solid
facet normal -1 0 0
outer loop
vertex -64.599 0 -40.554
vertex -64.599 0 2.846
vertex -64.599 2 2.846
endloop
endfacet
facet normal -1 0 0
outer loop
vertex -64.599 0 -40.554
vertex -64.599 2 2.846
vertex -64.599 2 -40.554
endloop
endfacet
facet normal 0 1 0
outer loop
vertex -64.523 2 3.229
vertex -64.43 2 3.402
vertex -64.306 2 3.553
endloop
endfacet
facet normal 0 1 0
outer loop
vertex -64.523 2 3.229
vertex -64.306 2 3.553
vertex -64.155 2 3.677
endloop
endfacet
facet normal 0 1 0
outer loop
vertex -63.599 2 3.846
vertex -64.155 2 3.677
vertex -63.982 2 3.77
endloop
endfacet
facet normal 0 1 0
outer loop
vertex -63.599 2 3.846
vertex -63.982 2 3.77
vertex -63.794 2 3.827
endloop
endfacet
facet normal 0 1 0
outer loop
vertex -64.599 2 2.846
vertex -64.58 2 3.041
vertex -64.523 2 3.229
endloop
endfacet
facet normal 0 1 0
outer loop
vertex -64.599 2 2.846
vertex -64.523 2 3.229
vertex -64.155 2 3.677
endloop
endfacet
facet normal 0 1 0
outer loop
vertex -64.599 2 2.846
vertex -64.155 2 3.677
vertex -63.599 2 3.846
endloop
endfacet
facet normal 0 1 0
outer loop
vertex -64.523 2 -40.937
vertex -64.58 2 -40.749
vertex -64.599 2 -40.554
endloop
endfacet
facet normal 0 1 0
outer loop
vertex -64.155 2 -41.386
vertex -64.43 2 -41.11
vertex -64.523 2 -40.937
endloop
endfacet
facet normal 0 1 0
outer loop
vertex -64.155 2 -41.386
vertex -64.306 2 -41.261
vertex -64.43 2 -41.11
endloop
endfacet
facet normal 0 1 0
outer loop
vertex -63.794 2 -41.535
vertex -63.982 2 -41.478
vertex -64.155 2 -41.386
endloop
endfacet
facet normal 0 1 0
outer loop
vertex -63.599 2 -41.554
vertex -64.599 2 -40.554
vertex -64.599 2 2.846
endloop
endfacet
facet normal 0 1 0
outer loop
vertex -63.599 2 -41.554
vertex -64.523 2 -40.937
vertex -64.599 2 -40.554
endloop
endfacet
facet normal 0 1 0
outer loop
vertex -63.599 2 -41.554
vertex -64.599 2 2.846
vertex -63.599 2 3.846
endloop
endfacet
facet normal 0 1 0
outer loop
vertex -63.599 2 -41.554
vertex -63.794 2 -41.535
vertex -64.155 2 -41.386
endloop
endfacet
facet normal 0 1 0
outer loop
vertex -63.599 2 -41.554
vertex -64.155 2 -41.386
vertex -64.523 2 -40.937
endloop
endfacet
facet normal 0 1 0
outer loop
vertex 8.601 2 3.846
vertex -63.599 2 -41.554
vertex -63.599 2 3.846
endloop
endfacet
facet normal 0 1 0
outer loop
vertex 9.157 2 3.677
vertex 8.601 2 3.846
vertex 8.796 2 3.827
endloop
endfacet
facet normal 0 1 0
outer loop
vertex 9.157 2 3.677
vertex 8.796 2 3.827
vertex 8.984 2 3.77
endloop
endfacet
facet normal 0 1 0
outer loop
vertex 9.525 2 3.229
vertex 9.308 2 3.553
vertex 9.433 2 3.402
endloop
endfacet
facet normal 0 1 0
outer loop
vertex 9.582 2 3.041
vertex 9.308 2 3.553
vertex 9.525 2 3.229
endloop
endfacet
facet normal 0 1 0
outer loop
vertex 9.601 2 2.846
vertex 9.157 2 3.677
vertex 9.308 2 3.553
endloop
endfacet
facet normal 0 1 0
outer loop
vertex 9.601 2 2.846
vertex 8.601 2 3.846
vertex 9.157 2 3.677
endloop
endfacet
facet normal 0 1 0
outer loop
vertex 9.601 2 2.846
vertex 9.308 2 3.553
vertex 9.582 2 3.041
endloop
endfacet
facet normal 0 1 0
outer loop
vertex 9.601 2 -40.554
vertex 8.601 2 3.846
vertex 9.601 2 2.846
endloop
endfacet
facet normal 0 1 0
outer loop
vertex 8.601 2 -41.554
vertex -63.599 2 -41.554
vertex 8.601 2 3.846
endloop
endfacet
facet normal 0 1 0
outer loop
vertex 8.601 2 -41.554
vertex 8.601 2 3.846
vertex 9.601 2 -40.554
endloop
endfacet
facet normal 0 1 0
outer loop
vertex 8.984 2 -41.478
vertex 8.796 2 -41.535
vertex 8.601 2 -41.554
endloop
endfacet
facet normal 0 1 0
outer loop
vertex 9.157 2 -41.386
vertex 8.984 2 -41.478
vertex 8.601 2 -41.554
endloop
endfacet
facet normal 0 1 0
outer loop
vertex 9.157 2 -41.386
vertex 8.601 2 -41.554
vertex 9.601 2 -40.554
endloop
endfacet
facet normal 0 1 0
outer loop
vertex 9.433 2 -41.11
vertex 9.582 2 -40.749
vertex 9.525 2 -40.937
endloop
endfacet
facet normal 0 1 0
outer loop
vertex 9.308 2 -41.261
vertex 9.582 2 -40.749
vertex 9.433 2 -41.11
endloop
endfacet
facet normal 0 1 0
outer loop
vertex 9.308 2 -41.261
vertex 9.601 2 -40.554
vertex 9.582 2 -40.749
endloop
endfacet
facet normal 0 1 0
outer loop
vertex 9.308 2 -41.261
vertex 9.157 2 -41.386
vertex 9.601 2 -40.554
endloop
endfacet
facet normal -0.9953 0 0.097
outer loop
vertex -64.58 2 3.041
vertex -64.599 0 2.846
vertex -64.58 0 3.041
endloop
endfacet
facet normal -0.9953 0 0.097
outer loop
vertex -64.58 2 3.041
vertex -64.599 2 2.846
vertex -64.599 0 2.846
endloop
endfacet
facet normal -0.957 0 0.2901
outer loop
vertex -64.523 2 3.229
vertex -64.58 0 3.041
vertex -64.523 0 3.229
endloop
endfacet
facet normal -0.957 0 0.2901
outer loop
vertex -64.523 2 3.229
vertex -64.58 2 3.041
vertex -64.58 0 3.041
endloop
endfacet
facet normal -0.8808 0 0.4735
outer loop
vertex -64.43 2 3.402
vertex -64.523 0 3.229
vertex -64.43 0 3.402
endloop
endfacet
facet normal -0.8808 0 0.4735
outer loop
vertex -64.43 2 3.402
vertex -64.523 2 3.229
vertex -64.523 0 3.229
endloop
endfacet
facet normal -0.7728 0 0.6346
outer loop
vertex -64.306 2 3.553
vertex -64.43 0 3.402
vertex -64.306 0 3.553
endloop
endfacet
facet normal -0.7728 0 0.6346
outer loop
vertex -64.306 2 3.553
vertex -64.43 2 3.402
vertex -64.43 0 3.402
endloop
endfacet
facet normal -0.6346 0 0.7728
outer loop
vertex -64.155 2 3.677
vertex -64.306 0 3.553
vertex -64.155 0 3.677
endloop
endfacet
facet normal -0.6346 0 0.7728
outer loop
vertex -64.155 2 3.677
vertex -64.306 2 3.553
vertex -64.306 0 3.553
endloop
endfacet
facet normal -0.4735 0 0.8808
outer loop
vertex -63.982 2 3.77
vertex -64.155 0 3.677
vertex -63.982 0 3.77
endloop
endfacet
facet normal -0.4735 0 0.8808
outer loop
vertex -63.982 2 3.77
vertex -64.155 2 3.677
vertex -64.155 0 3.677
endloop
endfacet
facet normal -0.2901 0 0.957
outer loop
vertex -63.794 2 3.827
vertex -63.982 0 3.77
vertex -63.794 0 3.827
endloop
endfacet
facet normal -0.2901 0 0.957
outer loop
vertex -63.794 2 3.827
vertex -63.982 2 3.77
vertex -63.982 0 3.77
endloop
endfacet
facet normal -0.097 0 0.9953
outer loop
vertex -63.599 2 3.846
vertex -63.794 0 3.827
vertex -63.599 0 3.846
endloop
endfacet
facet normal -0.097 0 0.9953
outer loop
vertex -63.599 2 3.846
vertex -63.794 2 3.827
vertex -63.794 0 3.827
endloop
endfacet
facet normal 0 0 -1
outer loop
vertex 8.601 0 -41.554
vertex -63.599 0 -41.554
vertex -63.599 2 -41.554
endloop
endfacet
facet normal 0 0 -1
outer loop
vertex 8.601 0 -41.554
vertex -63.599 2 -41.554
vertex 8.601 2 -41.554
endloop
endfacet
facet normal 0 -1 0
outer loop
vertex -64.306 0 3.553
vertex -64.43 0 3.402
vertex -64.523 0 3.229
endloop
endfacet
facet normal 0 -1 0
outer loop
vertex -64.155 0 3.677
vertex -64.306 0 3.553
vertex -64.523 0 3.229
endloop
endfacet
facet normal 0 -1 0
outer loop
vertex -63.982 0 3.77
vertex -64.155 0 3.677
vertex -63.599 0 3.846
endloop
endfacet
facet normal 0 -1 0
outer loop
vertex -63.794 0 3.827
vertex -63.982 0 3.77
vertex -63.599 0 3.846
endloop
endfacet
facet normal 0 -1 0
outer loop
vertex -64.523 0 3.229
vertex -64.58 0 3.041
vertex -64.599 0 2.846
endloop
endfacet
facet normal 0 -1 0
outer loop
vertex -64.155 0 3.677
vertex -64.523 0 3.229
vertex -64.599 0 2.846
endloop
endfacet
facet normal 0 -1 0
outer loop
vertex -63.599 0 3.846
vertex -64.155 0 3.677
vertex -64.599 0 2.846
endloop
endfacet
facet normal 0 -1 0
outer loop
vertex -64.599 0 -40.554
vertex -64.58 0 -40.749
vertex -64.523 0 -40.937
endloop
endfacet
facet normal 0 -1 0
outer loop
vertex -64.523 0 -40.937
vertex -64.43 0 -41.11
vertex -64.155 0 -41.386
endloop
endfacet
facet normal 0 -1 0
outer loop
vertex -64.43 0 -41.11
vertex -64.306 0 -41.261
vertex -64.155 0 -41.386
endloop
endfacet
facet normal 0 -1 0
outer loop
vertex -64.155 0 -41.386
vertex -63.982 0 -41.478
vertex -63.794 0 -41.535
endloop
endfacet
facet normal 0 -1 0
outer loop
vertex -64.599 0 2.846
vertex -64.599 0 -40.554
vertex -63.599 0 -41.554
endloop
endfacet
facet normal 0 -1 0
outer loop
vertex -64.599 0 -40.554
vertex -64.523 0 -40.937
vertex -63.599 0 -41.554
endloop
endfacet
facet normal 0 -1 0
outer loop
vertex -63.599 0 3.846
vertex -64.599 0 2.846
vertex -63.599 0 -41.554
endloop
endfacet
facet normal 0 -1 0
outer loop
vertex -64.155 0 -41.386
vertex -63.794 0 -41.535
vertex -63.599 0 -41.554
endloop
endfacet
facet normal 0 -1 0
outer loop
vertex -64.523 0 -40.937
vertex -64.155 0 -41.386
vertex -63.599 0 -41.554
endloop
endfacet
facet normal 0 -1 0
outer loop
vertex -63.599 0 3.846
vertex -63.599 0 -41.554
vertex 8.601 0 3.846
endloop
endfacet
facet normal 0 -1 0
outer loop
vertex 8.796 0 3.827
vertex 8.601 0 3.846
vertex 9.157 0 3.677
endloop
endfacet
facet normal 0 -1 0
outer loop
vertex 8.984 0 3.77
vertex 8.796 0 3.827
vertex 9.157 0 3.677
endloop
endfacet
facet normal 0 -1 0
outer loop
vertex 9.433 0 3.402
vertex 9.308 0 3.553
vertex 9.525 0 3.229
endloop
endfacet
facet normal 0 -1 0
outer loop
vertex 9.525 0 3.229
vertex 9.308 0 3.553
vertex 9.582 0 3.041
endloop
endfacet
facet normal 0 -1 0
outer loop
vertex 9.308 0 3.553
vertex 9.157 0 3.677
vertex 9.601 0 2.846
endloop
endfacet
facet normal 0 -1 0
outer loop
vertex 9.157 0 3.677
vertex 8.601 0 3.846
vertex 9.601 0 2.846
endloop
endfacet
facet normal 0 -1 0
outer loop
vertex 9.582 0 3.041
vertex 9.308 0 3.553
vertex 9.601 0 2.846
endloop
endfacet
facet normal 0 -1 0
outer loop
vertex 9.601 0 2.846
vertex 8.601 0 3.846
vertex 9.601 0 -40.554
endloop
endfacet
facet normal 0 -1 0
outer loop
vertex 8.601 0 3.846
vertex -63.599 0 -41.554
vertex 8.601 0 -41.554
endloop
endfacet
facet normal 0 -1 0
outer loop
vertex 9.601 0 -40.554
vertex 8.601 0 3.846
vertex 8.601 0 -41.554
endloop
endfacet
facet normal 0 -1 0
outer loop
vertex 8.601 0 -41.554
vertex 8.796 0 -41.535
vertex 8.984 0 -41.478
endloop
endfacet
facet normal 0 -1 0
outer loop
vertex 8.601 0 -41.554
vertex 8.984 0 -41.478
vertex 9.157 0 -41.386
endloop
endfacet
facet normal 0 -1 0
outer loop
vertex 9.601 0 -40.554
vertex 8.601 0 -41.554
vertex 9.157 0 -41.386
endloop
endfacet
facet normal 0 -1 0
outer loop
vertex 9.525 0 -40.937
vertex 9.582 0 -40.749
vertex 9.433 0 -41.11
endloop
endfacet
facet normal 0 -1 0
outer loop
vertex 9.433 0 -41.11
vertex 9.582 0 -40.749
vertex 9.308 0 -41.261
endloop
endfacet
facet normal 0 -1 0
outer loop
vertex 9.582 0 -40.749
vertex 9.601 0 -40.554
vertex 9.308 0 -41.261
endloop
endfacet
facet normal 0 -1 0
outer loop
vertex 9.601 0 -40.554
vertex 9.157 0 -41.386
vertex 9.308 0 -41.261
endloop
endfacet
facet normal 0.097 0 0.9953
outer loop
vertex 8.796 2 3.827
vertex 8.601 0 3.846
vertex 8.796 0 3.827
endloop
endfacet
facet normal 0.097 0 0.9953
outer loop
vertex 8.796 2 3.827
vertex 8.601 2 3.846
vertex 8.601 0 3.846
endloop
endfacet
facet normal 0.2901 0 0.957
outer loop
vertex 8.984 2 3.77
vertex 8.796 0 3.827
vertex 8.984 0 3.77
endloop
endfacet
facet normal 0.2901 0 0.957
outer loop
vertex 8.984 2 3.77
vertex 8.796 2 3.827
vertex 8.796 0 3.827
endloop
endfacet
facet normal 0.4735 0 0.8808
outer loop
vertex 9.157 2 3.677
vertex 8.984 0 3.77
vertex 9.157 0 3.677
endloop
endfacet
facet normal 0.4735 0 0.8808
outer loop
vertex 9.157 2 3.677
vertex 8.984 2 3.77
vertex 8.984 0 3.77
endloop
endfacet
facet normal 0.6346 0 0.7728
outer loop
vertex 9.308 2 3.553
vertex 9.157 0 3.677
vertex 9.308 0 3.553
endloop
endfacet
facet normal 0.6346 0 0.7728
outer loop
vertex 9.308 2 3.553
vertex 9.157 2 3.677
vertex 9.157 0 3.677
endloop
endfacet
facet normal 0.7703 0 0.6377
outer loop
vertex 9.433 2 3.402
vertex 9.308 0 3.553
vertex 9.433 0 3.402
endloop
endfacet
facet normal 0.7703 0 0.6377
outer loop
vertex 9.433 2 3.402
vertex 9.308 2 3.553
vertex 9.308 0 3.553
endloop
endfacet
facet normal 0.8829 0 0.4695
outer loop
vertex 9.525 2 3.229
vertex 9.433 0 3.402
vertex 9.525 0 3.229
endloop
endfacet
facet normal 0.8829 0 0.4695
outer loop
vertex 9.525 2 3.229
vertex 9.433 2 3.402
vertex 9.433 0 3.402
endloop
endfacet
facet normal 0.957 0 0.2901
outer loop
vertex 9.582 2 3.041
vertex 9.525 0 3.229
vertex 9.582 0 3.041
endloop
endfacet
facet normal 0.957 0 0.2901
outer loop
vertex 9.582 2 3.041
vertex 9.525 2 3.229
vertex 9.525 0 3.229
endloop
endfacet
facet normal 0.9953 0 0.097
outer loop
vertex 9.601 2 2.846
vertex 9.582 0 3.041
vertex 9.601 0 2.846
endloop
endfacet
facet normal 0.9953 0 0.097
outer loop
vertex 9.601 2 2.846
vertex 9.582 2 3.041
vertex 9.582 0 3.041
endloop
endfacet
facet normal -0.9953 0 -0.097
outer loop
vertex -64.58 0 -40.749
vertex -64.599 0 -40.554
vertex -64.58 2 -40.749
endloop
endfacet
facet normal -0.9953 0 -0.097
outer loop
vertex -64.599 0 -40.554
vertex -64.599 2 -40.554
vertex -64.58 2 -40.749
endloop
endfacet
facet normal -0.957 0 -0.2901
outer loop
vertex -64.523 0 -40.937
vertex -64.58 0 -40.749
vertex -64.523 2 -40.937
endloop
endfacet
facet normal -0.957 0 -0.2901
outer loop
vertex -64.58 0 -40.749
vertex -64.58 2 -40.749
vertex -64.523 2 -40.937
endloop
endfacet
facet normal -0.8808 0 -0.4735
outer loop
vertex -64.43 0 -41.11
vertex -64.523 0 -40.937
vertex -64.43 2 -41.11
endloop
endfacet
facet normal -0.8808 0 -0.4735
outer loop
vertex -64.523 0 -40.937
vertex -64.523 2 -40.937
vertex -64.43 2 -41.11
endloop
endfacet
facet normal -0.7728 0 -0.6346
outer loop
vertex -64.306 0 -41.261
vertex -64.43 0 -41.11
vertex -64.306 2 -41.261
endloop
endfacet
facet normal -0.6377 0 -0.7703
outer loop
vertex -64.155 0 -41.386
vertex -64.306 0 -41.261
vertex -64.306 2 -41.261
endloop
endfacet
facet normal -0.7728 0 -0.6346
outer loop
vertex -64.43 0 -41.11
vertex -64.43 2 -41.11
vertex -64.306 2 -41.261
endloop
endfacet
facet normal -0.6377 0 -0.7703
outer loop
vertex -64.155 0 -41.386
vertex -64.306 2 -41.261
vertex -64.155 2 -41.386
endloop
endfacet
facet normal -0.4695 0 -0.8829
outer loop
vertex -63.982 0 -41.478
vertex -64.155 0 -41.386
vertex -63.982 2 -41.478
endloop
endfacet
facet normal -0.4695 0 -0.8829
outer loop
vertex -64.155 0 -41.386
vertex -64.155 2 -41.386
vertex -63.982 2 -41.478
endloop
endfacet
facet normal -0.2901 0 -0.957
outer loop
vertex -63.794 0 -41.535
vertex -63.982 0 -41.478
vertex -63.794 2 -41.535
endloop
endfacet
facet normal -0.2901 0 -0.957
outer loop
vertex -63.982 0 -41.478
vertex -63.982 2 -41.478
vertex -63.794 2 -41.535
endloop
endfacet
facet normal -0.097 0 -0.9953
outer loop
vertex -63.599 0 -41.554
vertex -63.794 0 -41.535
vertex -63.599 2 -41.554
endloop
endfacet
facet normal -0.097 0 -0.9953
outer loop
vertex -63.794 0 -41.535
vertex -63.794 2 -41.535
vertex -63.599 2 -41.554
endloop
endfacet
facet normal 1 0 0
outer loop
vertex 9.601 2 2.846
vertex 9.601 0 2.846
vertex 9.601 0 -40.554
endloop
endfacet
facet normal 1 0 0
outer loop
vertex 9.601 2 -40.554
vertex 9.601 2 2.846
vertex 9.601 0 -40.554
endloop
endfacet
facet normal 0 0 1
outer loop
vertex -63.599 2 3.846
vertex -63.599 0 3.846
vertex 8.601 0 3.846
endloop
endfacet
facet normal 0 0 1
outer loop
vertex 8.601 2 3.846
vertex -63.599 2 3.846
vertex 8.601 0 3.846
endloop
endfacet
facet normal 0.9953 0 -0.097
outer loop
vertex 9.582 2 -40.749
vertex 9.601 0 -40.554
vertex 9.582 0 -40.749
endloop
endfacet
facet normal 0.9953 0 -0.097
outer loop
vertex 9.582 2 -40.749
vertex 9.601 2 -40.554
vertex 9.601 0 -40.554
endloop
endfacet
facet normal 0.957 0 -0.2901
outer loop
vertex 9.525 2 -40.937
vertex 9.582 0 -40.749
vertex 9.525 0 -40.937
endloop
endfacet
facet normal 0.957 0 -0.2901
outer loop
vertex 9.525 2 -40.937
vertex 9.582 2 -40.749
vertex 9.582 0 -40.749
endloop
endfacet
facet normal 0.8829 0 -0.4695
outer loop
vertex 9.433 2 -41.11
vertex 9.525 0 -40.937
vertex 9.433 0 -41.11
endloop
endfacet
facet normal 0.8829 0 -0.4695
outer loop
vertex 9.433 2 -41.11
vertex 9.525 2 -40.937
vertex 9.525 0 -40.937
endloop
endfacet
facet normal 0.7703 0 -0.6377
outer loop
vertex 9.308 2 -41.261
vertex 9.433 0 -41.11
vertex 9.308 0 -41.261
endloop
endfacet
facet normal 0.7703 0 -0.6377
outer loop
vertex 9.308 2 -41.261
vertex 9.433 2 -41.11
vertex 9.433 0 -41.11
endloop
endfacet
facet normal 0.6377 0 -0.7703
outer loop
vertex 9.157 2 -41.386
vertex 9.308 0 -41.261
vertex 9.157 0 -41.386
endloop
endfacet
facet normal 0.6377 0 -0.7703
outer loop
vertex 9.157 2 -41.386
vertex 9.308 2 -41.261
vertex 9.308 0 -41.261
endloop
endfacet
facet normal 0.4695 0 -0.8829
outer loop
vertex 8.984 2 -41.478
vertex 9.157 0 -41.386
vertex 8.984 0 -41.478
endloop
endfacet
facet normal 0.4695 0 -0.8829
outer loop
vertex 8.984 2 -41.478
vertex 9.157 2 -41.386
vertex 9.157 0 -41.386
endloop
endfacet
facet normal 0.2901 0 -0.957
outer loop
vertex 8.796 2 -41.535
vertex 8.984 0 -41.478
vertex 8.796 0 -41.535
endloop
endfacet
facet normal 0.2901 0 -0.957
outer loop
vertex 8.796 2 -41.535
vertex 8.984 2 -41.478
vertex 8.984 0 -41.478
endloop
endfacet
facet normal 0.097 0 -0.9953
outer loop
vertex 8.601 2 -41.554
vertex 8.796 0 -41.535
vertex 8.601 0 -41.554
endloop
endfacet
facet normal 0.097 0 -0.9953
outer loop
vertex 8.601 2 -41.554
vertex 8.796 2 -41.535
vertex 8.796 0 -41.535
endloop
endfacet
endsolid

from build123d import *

# Parameters (mm, degrees)
SZKIC1_W                    = 74.2
SZKIC1_H                    = 45.4
DODANIE_WYCI_GNI_CIE1_DEPTH = 2
ZAOKR_GLENIE1_R             = 1


with BuildPart() as part:
    # Szkic1 → Dodanie-wyciągnięcie1 (new body)
    with BuildSketch(Plane(origin=(0, 0, 0), x_dir=(1, 0, 0), z_dir=(0, 1, 0))):
        with Locations((-27.498947069, 18.854068499)):
            Rectangle(SZKIC1_W, SZKIC1_H)
    extrude(amount=DODANIE_WYCI_GNI_CIE1_DEPTH)

    # Zaokrąglenie1
    zaokr_glenie1_edges = [part.edges().sort_by_distance(p)[0] for p in [
        (-64.598947069, 1, -41.554068499),
        (9.601052931, 1, -41.554068499),
        (9.601052931, 1, 3.845931501),
        (-64.598947069, 1, 3.845931501),
    ]]
    fillet(zaokr_glenie1_edges, radius=ZAOKR_GLENIE1_R)


solid = part.part
